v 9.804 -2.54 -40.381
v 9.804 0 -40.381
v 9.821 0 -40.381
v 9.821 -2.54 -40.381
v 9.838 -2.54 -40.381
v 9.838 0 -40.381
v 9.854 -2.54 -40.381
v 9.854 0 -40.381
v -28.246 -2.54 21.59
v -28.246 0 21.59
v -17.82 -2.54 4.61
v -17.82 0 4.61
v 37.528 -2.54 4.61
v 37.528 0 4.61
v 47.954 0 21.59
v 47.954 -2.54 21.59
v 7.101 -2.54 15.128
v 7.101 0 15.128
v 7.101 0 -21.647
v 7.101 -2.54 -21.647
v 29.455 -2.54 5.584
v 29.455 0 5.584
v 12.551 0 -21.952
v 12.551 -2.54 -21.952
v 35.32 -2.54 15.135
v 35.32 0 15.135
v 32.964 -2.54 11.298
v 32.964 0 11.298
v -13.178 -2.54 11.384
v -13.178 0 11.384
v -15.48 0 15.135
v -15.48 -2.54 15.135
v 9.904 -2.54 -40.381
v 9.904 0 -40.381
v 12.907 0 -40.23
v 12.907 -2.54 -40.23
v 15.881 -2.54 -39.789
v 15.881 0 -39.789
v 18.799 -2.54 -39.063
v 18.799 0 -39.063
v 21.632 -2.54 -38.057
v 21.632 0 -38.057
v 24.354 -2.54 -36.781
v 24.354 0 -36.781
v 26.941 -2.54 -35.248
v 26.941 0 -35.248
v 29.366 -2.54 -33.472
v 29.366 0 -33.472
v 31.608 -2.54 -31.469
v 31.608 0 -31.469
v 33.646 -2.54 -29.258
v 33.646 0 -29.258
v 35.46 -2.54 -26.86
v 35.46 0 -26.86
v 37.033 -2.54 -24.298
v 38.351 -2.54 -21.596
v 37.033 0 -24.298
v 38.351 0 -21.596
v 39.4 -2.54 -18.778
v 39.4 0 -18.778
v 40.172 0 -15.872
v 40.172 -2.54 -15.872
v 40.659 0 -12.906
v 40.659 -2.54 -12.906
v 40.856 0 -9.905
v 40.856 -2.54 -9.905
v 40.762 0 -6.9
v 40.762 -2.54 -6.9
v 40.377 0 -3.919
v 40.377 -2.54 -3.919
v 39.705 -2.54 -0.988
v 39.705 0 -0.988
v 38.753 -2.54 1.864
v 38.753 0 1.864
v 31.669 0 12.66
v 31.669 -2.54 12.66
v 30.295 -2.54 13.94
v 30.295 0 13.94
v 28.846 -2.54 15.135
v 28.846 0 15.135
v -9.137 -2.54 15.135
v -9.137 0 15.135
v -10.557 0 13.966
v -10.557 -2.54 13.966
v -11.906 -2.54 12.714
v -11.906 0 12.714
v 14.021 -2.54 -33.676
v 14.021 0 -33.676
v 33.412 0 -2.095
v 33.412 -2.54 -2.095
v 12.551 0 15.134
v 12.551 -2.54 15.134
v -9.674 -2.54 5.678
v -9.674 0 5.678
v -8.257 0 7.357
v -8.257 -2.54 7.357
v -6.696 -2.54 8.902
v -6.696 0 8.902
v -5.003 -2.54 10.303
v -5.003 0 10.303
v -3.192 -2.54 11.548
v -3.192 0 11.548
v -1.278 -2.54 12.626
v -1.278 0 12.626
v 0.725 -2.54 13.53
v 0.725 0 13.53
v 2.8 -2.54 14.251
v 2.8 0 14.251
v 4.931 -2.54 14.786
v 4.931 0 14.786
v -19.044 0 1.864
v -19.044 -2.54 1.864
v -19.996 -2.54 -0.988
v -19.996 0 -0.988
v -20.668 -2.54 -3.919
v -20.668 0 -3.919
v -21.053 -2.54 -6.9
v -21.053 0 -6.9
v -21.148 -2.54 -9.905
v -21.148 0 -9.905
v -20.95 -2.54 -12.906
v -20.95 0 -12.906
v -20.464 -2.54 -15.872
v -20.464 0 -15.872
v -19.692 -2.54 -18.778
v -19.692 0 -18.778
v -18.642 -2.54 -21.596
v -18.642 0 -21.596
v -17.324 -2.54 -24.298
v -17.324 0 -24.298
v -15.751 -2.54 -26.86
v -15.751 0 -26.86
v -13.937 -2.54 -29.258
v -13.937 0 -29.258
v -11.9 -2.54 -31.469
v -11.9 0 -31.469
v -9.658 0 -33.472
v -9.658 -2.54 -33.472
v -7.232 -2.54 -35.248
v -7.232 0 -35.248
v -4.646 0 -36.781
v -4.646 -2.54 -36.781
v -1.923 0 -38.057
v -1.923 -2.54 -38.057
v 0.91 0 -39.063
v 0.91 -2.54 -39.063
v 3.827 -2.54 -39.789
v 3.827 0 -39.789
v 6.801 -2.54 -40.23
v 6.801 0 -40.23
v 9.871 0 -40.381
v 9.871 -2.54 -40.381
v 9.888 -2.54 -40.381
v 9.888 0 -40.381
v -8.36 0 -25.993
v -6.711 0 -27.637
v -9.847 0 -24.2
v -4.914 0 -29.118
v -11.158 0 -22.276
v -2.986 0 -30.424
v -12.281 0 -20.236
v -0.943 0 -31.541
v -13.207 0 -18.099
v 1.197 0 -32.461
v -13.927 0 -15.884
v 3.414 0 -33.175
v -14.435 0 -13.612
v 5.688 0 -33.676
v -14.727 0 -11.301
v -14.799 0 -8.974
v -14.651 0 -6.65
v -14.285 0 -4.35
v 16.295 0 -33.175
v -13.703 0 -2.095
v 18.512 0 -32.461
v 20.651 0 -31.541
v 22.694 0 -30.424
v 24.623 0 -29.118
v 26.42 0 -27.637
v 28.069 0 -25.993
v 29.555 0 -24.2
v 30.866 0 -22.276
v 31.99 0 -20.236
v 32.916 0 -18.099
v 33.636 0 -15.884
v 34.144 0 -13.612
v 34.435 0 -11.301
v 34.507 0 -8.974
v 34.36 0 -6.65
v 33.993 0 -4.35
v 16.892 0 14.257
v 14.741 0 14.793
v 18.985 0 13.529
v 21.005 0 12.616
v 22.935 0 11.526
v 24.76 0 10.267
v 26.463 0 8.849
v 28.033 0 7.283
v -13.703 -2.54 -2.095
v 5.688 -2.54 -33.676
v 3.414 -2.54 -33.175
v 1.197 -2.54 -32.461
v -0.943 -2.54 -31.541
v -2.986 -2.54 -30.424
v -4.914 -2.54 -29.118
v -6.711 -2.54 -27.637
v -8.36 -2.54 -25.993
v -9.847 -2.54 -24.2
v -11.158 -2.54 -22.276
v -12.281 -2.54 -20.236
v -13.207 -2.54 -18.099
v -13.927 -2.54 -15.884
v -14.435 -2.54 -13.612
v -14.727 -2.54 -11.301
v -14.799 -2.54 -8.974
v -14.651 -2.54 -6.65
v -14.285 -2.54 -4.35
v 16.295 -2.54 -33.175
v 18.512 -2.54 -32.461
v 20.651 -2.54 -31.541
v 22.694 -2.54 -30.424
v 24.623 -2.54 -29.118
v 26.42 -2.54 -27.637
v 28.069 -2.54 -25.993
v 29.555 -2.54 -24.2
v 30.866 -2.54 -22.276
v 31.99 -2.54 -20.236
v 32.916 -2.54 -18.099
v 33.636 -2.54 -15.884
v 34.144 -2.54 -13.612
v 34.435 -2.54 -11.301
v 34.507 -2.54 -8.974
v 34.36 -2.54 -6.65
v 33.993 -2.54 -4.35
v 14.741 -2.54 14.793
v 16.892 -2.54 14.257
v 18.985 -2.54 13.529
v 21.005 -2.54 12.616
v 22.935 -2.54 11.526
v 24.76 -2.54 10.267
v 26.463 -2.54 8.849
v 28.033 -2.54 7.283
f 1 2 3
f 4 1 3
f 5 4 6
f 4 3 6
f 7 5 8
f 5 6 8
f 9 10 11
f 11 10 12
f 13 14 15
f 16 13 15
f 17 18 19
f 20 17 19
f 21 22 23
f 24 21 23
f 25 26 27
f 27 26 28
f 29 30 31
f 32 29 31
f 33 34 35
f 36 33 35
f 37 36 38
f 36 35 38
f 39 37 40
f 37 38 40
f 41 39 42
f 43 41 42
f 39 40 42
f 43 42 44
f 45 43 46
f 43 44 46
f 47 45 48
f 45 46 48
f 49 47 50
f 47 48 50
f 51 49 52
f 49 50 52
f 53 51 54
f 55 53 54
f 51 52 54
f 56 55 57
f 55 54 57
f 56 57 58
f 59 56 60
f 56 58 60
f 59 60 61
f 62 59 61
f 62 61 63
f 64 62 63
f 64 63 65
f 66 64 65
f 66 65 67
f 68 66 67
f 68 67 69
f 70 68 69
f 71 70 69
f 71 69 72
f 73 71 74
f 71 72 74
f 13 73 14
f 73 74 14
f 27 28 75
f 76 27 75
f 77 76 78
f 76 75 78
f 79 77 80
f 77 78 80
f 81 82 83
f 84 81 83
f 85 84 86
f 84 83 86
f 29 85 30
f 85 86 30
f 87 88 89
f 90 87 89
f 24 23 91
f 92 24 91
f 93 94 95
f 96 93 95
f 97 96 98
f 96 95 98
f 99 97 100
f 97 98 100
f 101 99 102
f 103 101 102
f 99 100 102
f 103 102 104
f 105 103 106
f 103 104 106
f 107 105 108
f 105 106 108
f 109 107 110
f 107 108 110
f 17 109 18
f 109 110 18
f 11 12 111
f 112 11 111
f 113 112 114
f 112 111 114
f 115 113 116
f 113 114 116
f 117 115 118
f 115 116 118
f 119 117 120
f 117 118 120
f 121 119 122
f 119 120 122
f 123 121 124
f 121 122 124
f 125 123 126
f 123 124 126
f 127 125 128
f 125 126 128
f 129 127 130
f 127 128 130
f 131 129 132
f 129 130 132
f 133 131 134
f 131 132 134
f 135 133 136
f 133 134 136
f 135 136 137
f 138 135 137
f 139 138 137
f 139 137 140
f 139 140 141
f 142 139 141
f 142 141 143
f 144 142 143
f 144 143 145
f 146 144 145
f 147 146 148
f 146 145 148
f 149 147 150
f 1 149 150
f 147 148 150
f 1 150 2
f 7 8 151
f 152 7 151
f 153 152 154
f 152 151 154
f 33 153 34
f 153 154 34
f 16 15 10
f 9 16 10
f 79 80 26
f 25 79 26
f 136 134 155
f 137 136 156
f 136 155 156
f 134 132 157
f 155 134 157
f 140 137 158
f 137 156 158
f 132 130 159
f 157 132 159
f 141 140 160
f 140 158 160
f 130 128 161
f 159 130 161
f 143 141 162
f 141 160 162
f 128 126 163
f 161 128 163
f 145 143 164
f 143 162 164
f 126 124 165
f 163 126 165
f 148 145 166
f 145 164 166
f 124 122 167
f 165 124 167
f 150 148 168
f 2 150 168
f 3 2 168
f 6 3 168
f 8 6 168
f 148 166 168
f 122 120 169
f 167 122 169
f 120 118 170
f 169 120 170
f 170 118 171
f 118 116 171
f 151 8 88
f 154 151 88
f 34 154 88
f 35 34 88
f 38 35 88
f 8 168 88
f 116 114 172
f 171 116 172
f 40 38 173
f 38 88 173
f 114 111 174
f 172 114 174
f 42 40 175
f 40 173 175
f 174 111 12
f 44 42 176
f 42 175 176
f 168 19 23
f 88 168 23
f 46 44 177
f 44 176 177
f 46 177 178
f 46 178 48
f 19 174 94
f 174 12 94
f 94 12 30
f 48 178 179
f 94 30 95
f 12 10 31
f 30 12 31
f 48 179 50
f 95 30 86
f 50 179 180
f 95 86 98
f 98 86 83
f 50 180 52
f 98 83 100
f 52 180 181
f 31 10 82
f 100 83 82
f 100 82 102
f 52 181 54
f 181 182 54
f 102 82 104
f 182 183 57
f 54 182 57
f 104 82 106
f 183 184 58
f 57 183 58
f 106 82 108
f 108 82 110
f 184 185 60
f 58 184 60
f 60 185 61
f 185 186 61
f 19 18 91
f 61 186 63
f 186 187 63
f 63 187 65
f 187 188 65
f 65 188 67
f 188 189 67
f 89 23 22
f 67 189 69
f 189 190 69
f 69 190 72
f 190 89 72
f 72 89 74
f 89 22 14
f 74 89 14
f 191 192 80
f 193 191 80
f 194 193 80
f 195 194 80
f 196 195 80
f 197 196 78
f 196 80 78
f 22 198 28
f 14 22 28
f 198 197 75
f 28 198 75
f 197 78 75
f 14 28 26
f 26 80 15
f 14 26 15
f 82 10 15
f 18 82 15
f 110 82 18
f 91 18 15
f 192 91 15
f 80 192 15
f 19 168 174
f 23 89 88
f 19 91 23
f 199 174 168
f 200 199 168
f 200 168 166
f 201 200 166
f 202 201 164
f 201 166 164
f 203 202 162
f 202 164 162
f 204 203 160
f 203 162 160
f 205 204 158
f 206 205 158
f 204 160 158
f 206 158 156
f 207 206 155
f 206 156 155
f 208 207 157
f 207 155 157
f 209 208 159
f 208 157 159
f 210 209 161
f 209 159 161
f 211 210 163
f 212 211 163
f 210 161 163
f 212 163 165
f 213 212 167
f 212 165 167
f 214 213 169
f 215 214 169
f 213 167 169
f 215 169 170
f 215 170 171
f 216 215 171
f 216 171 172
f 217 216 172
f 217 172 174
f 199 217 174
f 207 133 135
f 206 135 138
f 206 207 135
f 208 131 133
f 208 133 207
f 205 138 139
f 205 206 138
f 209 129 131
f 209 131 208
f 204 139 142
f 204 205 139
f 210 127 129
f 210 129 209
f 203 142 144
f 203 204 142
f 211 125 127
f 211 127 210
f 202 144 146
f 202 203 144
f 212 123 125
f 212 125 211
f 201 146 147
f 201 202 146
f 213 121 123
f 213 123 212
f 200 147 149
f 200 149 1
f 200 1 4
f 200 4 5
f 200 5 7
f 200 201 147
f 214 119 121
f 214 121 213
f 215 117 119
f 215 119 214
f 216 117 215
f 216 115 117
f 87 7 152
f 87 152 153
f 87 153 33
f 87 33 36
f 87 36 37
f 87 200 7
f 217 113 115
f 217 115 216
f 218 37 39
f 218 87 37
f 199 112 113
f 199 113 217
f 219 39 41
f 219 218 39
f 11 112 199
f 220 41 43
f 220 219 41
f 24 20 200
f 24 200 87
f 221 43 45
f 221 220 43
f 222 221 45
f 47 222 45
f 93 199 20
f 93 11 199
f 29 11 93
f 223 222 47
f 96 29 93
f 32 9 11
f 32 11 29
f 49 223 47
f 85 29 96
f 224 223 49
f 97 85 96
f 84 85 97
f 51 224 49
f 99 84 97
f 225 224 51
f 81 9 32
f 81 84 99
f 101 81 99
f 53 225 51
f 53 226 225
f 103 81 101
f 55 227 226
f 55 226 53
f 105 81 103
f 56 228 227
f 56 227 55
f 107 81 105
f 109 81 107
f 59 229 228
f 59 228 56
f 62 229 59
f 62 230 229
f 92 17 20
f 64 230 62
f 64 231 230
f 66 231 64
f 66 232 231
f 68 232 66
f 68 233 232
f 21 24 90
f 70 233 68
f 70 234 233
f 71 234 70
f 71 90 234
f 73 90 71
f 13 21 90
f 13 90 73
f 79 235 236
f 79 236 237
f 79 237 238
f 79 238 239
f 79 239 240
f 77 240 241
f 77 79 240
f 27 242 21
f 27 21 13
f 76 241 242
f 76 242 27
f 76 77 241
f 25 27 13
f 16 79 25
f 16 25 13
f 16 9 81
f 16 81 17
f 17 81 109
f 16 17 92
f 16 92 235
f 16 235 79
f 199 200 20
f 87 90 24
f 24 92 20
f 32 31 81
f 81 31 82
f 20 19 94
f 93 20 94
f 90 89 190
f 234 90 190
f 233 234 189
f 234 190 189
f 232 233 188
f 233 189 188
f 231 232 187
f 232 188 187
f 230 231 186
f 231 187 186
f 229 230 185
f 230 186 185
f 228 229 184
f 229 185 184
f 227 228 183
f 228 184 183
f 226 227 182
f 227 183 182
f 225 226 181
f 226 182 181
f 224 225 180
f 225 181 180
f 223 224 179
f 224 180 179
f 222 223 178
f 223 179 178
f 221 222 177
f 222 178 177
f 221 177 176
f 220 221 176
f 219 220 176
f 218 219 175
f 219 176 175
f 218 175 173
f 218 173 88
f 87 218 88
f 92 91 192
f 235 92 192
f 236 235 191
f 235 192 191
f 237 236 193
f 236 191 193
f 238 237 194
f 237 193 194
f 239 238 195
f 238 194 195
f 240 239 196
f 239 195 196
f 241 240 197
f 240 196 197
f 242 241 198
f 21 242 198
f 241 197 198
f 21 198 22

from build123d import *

# Parameters (mm, degrees)
F1_DEPTH = 2.54


with BuildPart() as f1:
    # F0 (on Front) → F1 (new body)
    with BuildSketch(Plane.XZ):
        with BuildLine():
            Line((-28.245696, 21.590037), (-17.819697, 4.609524))
            ThreePointArc((-17.819697, 4.609524), (-16.568917, -25.598129), (9.804215, -40.380711))
            ThreePointArc((9.804215, -40.380711), (9.829259, -40.380741), (9.854304, -40.380751))
            ThreePointArc((9.854304, -40.380751), (9.879348, -40.380741), (9.904392, -40.380711))
            ThreePointArc((9.904392, -40.380711), (36.277524, -25.598129), (37.528304, 4.609524))
            Line((37.528304, 4.609524), (47.954304, 21.590037))
            Line((47.954304, 21.590037), (11.468784, 21.590037))
            Line((11.468784, 21.590037), (9.854304, 21.590037))
            Line((9.854304, 21.590037), (8.239823, 21.590037))
            Line((8.239823, 21.590037), (-28.245696, 21.590037))
        make_face()
        with BuildLine():
            ThreePointArc((5.687621, -33.676138), (-11.15754, -22.275555), (-13.703103, -2.095048))
            Line((-13.703103, -2.095048), (5.687621, -33.676138))
        make_face(mode=Mode.SUBTRACT)
        with BuildLine():
            ThreePointArc((33.41171, -2.095048), (30.866148, -22.275555), (14.020986, -33.676138))
            Line((14.020986, -33.676138), (33.41171, -2.095048))
        make_face(mode=Mode.SUBTRACT)
        with BuildLine():
            Line((7.10099, -21.646665), (-9.674308, 5.678003))
            ThreePointArc((-9.674308, 5.678003), (-2.247189, 12.108065), (7.10099, 15.127888))
            Line((7.10099, 15.127888), (7.10099, -21.646665))
        make_face(mode=Mode.SUBTRACT)
        with BuildLine():
            Line((-13.177649, 11.384468), (-15.480497, 15.135492))
            Line((-15.480497, 15.135492), (-9.136935, 15.135492))
            ThreePointArc((-9.136935, 15.135492), (-11.240831, 13.34997), (-13.177649, 11.384468))
        make_face(mode=Mode.SUBTRACT)
        with BuildLine():
            ThreePointArc((12.550589, 15.13423), (21.982633, 12.092926), (29.455338, 5.583573))
            Line((29.455338, 5.583573), (12.550589, -21.951937))
            Line((12.550589, -21.951937), (12.550589, 15.13423))
        make_face(mode=Mode.SUBTRACT)
        with BuildLine():
            Line((28.845543, 15.135492), (35.319503, 15.135492))
            Line((35.319503, 15.135492), (32.963703, 11.298217))
            ThreePointArc((32.963703, 11.298217), (30.991879, 13.310498), (28.845543, 15.135492))
        make_face(mode=Mode.SUBTRACT)
    extrude(amount=F1_DEPTH)


solid = f1.part
